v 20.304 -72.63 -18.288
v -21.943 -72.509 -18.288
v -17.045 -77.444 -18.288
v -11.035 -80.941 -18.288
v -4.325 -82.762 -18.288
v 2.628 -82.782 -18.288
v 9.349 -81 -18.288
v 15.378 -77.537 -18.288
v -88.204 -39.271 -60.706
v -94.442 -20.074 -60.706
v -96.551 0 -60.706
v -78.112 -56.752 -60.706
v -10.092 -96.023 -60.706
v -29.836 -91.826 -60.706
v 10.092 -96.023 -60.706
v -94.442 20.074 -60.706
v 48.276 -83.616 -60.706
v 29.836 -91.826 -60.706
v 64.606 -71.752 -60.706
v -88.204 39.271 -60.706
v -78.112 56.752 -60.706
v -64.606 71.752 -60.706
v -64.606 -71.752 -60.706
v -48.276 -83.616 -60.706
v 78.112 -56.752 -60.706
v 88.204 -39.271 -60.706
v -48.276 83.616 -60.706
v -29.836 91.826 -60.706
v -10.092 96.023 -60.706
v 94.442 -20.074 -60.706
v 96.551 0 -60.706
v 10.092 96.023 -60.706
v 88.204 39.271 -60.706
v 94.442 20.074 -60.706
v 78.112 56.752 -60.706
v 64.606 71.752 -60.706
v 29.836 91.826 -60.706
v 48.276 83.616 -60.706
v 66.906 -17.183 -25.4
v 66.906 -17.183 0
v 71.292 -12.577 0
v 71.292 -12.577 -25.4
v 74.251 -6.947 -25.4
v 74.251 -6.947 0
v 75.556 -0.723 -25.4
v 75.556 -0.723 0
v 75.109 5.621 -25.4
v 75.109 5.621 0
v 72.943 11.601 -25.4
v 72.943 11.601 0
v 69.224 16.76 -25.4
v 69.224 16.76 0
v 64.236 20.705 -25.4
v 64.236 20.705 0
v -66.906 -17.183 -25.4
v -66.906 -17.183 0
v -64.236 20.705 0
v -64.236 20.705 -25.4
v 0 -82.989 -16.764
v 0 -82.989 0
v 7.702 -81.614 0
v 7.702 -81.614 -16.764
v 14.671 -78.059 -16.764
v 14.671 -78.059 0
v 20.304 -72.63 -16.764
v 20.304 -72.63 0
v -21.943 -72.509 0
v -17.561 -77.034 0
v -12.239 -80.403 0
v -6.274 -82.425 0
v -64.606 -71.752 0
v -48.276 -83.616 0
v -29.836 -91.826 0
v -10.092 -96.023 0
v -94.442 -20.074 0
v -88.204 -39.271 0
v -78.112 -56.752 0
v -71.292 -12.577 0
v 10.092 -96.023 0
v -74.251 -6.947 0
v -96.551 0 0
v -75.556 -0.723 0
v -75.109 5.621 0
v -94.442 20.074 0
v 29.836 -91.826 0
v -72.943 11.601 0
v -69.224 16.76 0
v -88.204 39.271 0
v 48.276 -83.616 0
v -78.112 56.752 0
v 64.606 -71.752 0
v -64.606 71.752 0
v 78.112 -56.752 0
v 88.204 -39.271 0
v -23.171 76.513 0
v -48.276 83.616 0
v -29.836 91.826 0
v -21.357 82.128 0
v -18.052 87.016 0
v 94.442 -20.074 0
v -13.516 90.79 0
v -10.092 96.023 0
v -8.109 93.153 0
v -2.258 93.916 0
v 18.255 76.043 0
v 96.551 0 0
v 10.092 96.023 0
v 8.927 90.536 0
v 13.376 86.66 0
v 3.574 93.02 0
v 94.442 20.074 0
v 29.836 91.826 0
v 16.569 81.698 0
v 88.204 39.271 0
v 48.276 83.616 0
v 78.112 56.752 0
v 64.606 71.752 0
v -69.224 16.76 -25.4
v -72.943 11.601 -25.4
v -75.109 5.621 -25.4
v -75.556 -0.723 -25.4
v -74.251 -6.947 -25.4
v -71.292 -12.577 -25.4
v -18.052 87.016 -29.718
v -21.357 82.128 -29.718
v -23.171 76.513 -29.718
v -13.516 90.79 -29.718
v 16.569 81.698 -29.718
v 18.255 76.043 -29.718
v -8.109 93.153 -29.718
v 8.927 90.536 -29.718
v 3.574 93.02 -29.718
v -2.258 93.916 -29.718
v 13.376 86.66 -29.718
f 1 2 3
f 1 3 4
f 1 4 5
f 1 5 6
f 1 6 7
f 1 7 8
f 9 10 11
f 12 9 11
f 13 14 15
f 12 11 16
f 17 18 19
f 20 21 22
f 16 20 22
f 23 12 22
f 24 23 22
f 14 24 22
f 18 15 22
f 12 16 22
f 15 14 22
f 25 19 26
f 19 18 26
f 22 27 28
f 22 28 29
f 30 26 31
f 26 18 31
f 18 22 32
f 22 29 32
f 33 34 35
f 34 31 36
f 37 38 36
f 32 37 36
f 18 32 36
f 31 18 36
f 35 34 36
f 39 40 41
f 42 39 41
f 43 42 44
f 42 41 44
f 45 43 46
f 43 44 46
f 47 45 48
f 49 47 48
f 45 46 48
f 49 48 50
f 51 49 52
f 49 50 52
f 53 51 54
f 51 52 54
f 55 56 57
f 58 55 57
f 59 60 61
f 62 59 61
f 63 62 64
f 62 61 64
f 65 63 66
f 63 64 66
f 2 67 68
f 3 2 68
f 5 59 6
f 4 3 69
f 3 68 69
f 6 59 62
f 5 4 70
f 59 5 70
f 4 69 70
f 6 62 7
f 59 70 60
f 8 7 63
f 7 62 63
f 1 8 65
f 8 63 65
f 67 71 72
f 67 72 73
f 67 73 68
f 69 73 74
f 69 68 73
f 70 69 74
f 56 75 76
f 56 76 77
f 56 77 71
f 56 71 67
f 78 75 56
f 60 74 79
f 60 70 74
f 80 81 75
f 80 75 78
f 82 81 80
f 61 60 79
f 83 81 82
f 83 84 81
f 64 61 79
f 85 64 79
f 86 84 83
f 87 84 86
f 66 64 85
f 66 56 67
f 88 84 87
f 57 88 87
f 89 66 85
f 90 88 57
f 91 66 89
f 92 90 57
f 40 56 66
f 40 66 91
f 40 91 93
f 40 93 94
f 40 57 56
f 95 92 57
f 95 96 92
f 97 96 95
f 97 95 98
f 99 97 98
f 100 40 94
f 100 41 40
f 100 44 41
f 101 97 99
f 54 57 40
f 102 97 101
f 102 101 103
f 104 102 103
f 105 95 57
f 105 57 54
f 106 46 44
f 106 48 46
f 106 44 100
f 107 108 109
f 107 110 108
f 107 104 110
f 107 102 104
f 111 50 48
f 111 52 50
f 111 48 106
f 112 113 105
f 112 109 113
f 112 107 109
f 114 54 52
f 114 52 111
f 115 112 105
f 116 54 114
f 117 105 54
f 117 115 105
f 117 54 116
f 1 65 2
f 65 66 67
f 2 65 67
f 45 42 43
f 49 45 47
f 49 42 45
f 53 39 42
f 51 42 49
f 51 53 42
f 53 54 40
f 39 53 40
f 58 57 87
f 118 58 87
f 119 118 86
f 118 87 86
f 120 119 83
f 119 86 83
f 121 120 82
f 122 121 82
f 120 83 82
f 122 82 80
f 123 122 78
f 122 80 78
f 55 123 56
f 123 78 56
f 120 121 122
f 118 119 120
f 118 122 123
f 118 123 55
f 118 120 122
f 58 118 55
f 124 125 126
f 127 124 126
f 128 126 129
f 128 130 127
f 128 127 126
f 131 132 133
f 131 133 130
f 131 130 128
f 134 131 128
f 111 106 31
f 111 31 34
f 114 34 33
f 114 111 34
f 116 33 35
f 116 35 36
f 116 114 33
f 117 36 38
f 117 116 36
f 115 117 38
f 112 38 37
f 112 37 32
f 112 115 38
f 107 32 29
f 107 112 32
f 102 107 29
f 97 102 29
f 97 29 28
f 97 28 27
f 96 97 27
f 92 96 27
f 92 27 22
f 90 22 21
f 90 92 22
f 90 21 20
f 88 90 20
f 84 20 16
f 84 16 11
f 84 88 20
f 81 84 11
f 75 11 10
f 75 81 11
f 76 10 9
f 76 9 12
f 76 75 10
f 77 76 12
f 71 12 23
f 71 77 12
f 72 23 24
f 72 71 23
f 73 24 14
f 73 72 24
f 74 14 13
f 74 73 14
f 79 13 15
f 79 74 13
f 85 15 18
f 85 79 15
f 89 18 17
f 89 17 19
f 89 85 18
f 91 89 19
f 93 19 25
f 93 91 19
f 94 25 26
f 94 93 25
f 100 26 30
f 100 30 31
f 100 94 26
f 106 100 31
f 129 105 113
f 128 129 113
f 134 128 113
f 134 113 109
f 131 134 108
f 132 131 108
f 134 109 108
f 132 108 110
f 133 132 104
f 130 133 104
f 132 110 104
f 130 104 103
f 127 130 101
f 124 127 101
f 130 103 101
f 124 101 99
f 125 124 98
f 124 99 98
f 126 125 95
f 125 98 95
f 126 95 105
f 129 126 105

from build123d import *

# Parameters (mm, degrees)
F0_R      = 96.551429
F1_DEPTH  = 60.706
F4_DEPTH  = 16.764
F5_DEPTH  = 18.288
F7_DEPTH  = 29.718
F9_DEPTH  = 24.892
F10_DEPTH = 25.4


with BuildPart() as f1:
    # F0 (on Top) → F1 (new body)
    with BuildSketch(Plane.XY):
        Circle(F0_R)
    extrude(amount=-F1_DEPTH)

    # F3 (on face) → F4 (cut)
    with BuildSketch(Plane.XY):
        with BuildLine():
            Line((0, -72.571998), (0, -82.988975))
            ThreePointArc((0, -82.988975), (11.31764, -80.094339), (20.304218, -72.630472))
            Line((20.304218, -72.630472), (0, -72.571998))
        make_face()
    extrude(amount=-F4_DEPTH, mode=Mode.SUBTRACT)

    # F3 (on face) → F5 (cut)
    with BuildSketch(Plane.XY):
        with BuildLine():
            Line((20.304218, -72.630472), (-21.942582, -72.508805))
            ThreePointArc((-21.942582, -72.508805), (-0.849221, -83.000085), (20.304218, -72.630472))
        make_face()
    extrude(amount=-F5_DEPTH, mode=Mode.SUBTRACT)

    # F6 (on Top) → F7 (cut)
    with BuildSketch(Plane.XY):
        with BuildLine():
            Line((-23.170974, 76.51294), (18.255305, 76.043338))
            ThreePointArc((18.255305, 76.043338), (-2.257895, 93.915969), (-23.170974, 76.51294))
        make_face()
    extrude(amount=-F7_DEPTH, mode=Mode.SUBTRACT)

    # F8 (on Top) → F9 (cut)
    with BuildSketch(Plane.XY):
        with BuildLine():
            Line((64.235799, 20.705102), (66.905841, -17.182859))
            ThreePointArc((66.905841, -17.182859), (75.55273, 2.464567), (64.235799, 20.705102))
        make_face()
        with BuildLine():
            ThreePointArc((-64.235799, 20.705102), (-75.55273, 2.464567), (-66.905841, -17.182859))
            Line((-66.905841, -17.182859), (-64.235799, 20.705102))
        make_face()
    extrude(amount=-F9_DEPTH, mode=Mode.SUBTRACT)

    # F8 (on Top) → F10 (cut)
    with BuildSketch(Plane.XY):
        with BuildLine():
            Line((64.235799, 20.705102), (66.905841, -17.182859))
            ThreePointArc((66.905841, -17.182859), (75.55273, 2.464567), (64.235799, 20.705102))
        make_face()
        with BuildLine():
            ThreePointArc((-64.235799, 20.705102), (-75.55273, 2.464567), (-66.905841, -17.182859))
            Line((-66.905841, -17.182859), (-64.235799, 20.705102))
        make_face()
    extrude(amount=-F10_DEPTH, mode=Mode.SUBTRACT)


solid = f1.part
